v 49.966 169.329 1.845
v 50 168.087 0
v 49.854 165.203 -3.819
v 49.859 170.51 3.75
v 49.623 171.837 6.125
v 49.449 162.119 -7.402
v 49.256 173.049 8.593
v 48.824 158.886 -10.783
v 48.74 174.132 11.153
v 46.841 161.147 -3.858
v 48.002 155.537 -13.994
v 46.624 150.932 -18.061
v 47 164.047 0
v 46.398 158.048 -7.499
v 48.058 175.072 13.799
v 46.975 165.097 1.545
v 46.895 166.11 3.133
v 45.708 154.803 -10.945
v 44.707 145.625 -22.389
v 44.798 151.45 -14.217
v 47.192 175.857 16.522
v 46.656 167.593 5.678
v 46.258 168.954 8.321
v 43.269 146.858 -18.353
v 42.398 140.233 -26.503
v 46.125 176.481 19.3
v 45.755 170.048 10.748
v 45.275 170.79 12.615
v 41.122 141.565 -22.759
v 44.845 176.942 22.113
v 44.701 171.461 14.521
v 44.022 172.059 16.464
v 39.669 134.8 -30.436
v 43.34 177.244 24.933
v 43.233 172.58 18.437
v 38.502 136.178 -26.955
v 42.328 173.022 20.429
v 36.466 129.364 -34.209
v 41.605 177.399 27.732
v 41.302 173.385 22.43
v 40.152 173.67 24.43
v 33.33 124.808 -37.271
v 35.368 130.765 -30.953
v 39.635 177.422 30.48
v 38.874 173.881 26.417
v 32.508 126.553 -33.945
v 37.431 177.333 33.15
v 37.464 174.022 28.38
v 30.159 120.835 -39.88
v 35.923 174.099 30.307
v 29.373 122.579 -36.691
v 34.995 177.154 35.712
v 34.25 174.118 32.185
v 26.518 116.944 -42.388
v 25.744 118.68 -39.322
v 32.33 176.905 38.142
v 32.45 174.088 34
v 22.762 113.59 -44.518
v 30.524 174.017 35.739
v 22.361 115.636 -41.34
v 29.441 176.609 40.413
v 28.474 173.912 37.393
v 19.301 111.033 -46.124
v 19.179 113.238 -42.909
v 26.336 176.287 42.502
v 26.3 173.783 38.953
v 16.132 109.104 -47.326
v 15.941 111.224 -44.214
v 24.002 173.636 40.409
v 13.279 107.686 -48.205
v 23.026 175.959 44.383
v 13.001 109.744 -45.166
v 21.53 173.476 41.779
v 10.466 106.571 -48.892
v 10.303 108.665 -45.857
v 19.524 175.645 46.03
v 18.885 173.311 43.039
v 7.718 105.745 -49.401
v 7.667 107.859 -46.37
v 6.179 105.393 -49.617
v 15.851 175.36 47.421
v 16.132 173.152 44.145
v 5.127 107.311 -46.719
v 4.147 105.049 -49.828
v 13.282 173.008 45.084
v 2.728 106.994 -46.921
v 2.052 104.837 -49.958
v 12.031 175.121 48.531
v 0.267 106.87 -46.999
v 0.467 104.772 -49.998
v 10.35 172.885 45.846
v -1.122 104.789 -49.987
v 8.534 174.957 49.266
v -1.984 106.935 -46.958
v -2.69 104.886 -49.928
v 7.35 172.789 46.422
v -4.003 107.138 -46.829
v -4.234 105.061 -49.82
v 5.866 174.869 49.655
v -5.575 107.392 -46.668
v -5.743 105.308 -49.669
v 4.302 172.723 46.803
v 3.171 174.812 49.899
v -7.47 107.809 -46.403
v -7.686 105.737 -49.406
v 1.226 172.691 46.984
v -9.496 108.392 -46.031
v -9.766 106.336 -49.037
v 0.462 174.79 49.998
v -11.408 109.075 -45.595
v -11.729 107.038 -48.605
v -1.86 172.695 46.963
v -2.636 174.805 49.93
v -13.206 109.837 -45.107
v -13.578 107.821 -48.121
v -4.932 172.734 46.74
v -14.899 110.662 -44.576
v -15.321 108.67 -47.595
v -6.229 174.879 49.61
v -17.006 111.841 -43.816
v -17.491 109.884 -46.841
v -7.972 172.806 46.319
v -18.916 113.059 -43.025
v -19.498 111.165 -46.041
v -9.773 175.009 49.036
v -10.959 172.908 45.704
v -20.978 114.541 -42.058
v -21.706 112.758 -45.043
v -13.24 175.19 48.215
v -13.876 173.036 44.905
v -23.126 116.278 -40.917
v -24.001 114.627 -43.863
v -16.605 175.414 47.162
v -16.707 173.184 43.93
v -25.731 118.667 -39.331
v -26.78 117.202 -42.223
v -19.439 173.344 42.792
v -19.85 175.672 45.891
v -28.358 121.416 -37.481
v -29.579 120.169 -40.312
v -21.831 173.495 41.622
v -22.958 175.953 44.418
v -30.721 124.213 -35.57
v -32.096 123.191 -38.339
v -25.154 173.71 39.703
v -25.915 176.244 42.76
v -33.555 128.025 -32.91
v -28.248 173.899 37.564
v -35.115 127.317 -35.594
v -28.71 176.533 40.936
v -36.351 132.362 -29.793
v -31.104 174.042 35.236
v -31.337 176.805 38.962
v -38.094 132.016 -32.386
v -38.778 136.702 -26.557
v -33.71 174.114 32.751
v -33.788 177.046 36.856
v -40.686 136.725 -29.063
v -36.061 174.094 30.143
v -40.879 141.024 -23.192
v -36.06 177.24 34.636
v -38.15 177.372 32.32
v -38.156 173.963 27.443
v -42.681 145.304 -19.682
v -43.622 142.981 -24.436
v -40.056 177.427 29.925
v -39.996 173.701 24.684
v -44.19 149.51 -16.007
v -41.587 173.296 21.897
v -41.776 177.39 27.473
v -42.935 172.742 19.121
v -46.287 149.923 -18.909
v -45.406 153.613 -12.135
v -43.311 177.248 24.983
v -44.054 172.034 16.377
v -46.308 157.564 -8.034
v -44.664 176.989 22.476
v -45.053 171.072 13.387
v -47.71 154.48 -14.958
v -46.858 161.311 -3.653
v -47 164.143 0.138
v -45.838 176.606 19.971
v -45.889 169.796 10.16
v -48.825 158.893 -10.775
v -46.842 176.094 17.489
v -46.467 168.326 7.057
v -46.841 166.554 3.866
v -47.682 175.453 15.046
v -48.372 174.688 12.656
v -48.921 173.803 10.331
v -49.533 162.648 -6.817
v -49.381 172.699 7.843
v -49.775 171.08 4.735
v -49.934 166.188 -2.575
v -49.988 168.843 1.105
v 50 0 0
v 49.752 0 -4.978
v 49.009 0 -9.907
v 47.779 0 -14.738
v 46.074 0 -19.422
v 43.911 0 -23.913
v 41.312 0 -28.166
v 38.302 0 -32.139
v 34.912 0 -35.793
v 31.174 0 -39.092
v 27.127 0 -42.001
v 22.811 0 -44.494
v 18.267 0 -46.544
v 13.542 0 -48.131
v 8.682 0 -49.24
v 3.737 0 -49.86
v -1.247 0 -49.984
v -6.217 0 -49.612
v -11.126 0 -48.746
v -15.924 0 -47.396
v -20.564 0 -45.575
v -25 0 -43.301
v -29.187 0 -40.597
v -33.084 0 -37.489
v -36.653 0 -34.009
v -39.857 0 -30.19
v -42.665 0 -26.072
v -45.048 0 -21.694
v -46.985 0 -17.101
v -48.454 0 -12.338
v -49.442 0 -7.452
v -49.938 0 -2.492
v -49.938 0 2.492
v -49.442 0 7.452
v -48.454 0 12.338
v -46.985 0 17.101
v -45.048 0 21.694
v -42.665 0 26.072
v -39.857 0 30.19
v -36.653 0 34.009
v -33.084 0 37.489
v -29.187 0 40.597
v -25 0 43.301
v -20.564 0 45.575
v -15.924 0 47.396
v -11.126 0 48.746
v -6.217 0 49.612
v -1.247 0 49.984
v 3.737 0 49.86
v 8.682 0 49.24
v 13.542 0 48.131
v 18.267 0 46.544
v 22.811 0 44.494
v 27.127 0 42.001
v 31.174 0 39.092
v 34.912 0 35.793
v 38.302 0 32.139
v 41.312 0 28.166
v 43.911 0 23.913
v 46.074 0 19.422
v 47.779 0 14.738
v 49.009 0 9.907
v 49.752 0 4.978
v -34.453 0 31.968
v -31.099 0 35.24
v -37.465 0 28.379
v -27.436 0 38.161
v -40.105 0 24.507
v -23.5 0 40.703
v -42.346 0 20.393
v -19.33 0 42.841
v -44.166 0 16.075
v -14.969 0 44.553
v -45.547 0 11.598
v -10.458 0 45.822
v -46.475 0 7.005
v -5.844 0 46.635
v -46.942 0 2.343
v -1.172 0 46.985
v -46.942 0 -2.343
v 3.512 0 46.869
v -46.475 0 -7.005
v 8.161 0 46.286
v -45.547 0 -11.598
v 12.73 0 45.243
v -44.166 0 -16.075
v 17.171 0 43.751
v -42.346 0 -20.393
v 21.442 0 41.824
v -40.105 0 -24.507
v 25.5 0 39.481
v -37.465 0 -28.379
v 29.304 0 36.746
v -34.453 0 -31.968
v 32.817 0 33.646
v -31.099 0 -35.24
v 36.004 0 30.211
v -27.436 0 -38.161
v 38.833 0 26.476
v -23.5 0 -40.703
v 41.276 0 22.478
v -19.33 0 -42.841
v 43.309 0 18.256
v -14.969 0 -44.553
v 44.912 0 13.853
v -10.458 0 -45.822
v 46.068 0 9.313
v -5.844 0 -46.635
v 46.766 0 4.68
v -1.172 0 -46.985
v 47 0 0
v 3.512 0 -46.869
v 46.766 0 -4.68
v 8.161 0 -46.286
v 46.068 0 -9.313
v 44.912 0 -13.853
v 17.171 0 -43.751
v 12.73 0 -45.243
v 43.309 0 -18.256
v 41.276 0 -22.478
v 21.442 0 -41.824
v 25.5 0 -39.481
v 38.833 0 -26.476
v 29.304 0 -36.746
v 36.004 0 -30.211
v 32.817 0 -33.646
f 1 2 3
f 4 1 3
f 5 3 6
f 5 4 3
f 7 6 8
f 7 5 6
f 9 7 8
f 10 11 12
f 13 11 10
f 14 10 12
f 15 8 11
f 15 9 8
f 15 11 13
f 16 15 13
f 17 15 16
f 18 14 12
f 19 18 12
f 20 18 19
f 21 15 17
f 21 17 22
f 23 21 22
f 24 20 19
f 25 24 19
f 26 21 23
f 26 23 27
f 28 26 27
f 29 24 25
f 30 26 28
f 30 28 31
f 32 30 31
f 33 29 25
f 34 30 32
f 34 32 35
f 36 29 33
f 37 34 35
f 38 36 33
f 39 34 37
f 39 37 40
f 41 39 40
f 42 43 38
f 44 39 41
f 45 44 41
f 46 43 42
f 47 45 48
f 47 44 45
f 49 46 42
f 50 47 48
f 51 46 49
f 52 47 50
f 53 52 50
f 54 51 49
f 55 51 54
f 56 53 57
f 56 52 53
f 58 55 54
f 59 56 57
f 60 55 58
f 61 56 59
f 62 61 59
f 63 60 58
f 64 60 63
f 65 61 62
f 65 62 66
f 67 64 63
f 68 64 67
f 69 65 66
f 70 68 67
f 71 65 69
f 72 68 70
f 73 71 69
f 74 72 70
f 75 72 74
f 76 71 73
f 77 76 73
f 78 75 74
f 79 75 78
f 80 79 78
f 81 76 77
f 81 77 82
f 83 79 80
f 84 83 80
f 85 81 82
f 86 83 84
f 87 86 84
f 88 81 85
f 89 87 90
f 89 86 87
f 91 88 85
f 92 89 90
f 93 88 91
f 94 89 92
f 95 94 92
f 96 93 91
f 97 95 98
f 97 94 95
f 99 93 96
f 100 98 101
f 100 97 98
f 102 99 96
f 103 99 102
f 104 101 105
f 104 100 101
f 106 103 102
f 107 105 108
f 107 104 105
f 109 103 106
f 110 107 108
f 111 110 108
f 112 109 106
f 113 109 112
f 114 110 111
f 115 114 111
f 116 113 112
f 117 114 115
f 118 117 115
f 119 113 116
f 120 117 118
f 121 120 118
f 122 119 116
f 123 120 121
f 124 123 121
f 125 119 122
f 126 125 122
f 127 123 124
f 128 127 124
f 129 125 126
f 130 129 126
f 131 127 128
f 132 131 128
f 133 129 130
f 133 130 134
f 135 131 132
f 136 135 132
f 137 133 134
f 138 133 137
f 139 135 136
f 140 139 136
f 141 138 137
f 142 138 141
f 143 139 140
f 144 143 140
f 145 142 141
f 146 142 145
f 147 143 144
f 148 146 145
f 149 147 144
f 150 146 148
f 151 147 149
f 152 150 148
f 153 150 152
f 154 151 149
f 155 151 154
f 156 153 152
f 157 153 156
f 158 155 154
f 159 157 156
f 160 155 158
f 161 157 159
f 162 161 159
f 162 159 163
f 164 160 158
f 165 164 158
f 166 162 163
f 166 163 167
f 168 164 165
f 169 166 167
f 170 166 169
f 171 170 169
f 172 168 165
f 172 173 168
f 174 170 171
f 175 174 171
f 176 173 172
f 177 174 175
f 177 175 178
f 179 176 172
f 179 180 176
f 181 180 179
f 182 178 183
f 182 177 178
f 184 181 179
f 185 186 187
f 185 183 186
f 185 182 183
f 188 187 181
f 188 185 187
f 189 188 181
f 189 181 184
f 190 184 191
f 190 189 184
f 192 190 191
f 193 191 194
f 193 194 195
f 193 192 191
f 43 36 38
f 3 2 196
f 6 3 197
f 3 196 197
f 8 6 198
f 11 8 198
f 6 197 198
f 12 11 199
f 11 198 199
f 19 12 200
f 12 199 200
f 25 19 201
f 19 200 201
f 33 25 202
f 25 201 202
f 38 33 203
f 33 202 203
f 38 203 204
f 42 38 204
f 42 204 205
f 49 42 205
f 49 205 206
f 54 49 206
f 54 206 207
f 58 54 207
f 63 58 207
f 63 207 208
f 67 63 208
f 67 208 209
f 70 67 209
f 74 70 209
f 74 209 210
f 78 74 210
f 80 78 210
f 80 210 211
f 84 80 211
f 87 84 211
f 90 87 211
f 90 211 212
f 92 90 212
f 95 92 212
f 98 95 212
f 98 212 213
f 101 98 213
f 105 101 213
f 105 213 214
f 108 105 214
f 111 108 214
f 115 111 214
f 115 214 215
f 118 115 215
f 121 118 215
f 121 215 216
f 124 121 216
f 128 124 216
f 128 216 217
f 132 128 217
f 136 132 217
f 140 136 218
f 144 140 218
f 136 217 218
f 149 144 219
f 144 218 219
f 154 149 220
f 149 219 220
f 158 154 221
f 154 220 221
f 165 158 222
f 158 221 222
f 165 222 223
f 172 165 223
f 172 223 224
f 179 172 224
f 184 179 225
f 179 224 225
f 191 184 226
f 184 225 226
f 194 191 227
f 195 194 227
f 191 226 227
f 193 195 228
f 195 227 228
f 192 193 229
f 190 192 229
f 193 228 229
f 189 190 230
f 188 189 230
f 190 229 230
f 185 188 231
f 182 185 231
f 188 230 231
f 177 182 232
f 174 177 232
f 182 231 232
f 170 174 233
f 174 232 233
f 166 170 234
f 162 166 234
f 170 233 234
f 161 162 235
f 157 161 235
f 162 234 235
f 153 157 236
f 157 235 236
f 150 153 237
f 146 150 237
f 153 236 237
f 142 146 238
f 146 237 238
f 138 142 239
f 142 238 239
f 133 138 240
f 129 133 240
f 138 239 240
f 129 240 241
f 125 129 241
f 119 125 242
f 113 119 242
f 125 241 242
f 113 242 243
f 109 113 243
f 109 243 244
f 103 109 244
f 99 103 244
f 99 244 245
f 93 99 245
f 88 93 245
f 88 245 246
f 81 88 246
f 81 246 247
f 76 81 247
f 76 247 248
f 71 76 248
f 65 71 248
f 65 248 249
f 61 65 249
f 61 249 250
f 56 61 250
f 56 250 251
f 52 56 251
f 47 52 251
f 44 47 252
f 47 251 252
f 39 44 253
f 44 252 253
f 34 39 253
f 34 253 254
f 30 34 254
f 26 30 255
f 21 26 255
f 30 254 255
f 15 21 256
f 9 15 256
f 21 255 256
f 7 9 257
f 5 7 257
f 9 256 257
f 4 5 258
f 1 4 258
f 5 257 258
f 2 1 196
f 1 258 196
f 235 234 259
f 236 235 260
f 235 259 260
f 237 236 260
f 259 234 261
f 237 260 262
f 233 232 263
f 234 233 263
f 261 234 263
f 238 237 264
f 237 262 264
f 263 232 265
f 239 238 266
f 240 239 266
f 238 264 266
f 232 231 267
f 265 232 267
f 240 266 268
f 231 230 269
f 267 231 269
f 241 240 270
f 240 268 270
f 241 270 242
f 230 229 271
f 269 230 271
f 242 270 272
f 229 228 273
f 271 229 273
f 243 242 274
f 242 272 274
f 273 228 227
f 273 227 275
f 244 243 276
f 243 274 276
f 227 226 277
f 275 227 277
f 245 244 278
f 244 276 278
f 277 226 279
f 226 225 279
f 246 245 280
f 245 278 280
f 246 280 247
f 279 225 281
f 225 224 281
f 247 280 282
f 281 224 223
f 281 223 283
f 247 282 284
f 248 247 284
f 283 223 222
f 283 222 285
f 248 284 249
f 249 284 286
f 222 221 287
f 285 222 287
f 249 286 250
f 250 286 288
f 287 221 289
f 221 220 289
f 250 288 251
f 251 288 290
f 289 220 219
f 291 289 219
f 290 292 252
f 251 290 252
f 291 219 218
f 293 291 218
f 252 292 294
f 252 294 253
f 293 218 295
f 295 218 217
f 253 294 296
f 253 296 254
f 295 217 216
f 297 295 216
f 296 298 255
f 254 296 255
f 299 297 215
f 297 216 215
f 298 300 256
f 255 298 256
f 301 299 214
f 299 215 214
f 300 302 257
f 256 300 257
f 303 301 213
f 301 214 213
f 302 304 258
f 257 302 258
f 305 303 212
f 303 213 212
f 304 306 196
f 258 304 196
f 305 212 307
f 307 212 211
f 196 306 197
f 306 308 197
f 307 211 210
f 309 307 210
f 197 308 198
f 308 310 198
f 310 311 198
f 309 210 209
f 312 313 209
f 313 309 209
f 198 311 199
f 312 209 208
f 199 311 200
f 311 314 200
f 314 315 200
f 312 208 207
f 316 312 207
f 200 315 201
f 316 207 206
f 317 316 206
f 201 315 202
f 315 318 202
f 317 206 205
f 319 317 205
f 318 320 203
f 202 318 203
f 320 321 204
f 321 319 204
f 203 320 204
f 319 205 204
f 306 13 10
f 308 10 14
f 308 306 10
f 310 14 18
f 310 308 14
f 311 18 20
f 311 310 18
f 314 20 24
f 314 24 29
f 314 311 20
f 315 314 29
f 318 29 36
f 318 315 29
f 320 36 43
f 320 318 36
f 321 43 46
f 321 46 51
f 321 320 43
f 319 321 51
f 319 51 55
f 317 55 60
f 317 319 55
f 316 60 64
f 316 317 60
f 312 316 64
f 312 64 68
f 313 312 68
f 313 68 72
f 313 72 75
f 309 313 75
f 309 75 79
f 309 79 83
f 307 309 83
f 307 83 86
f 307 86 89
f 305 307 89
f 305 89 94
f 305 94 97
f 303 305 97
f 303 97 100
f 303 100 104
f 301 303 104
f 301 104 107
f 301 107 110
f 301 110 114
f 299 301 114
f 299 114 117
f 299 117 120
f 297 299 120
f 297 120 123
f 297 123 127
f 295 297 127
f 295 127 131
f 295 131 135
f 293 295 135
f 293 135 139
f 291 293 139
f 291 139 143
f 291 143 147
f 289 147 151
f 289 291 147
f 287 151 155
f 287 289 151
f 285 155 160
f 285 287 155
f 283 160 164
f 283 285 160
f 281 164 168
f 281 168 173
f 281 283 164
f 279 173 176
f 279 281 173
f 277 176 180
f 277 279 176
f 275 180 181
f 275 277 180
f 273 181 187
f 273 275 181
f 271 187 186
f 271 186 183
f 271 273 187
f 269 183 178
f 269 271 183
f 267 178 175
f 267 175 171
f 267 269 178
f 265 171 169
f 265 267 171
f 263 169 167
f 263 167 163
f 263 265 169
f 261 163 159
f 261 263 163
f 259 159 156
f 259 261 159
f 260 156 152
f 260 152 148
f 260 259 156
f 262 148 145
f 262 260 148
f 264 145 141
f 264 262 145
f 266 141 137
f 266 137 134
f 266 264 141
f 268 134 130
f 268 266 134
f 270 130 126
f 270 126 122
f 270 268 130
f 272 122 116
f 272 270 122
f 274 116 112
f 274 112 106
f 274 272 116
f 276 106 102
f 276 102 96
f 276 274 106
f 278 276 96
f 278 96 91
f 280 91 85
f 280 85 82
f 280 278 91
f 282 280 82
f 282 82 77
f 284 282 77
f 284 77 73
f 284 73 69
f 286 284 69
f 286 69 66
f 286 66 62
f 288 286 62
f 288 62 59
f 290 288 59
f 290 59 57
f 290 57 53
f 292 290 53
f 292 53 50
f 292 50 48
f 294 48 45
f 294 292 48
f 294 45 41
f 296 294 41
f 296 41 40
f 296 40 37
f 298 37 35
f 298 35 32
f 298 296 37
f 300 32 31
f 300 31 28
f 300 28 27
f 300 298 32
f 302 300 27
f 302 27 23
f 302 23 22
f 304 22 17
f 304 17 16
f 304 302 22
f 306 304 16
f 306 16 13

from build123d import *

# Parameters (mm, degrees)
EXTRUDE_1_OUTLINE_R      = 50
EXTRUDE_1_OUTLINE_R_2    = 47
EXTRUDE_1_DEPTH          = 200
CUT_EXTRUDE_1_DEPTH      = 213.132034356
CUT_EXTRUDE_1_DEPTH_BACK = 213.132034356
SKETCH_2_R               = 65.5


# Read off the part's stored shape, not the designer's step: Вытянуть-Тонкостенный1
with BuildPart() as part:
    # Вытянуть-Тонкостенный1 outline → Вытянуть-Тонкостенный1 (new body)
    with BuildSketch(Plane(origin=(0, 0, 0), x_dir=(1, 0, 0), z_dir=(0, 1, 0))):
        Circle(EXTRUDE_1_OUTLINE_R)
        Circle(EXTRUDE_1_OUTLINE_R_2, mode=Mode.SUBTRACT)
    extrude(amount=EXTRUDE_1_DEPTH)

    # Эскиз2 → Вырез-Вытянуть1 (cut, two sides: drawn at the far end of the back side and taken through both)
    with BuildSketch(Plane(origin=(0, 0, 0), x_dir=(1, 0, 0), z_dir=(0, -0.5735764363510444, -0.819152044288993)).offset(-CUT_EXTRUDE_1_DEPTH_BACK)):
        with Locations((0, -180)):
            Circle(SKETCH_2_R)
    extrude(amount=CUT_EXTRUDE_1_DEPTH + CUT_EXTRUDE_1_DEPTH_BACK, mode=Mode.SUBTRACT)


solid = part.part
